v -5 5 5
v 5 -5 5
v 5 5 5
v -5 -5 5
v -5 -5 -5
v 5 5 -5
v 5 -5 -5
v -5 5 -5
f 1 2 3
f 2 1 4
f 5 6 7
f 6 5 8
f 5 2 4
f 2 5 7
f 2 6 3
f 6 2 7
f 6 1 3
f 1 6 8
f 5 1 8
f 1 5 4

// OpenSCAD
// Parameters
cube_size = 10;
$fn = 20;

// Model
color("red")
  cube([cube_size, cube_size, cube_size], center=true);
